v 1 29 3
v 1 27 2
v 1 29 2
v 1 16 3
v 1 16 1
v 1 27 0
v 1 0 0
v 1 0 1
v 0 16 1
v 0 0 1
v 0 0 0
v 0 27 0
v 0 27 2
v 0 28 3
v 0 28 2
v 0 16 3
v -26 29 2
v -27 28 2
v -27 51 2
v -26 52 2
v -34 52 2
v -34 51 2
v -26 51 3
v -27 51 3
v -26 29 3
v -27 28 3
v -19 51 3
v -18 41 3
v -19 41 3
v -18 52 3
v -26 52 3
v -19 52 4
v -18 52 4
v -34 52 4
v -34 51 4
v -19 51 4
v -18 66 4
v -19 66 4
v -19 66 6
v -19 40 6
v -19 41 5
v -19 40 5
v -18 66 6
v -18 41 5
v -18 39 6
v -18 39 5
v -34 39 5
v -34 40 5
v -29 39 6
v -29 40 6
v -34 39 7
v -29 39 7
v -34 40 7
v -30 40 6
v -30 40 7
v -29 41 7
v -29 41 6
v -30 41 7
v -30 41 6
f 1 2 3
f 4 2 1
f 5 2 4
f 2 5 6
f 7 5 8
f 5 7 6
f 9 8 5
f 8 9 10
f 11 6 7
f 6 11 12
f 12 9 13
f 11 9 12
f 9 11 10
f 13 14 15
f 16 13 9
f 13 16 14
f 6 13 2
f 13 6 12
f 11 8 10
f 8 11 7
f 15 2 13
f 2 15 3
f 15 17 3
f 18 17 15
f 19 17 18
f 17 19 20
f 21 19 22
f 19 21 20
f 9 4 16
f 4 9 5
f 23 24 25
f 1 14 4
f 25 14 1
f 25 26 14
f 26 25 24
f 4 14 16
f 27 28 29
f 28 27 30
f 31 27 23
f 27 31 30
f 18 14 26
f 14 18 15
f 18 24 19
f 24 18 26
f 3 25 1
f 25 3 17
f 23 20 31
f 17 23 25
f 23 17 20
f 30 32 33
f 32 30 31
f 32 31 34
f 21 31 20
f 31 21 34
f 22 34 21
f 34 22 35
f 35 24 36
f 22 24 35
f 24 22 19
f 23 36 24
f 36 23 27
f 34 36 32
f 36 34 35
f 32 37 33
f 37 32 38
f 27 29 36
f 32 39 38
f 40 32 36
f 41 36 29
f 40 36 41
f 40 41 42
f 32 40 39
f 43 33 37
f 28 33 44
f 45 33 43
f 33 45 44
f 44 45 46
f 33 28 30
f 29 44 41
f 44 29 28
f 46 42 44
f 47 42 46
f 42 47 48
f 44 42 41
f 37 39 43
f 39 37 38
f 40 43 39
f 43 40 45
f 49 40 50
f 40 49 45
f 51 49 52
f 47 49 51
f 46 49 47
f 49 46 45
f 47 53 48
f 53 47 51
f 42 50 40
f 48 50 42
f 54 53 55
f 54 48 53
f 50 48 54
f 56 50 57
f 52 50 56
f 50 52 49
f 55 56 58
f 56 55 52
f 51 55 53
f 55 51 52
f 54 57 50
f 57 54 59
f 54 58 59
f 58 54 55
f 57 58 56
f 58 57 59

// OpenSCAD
cube([1,27,1]);
translate([0, (27-11), 1]) {
    cube([1, 11, 1]);
    }
translate([0, (27-11), 2]) {
    cube([1, 12, 1]);
    }
translate([-27, (27-11+12), 2]) {
    cube([28, 1, 1]);
    }
translate([-27, (27-11+12), 2]) {
    cube([1, 24, 1]);
    }
translate([-27-7, (27-11+12+23), 2]) {
    cube([7, 1, 1]);
    }
translate([-27-7, (27-11+12+23), 3]) {
    cube([3, 1, 1]);
    }
translate([-27-7+3, (27-11+12+23), 3]) {
    cube([12, 1, 1]);
    }
translate([-27-7+3+12, (27-11+12+23-10), 3]) {
    cube([1, 11, 1]);
    }
translate([-27-7+3+12, (27-11+12+23-10), 4]) {
    cube([1, 25, 1]);
    }
translate([-27-7+3+12, (27-11+12+23-10+25-27), 5]) {
    cube([1, 27, 1]);
    }
translate([-27-7+3+12-15, (27-11+12+23-10+25-27), 5]) {
    cube([15, 1, 1]);
    }
translate([-27-7+3+12-15, (27-11+12+23-10+25-27), 6]) {
    cube([5, 1, 1]);
    }
translate([-27-7+3+12-15+4, (27-11+12+23-10+25-27+1), 6]) {
    cube([1, 1, 1]);
    }
